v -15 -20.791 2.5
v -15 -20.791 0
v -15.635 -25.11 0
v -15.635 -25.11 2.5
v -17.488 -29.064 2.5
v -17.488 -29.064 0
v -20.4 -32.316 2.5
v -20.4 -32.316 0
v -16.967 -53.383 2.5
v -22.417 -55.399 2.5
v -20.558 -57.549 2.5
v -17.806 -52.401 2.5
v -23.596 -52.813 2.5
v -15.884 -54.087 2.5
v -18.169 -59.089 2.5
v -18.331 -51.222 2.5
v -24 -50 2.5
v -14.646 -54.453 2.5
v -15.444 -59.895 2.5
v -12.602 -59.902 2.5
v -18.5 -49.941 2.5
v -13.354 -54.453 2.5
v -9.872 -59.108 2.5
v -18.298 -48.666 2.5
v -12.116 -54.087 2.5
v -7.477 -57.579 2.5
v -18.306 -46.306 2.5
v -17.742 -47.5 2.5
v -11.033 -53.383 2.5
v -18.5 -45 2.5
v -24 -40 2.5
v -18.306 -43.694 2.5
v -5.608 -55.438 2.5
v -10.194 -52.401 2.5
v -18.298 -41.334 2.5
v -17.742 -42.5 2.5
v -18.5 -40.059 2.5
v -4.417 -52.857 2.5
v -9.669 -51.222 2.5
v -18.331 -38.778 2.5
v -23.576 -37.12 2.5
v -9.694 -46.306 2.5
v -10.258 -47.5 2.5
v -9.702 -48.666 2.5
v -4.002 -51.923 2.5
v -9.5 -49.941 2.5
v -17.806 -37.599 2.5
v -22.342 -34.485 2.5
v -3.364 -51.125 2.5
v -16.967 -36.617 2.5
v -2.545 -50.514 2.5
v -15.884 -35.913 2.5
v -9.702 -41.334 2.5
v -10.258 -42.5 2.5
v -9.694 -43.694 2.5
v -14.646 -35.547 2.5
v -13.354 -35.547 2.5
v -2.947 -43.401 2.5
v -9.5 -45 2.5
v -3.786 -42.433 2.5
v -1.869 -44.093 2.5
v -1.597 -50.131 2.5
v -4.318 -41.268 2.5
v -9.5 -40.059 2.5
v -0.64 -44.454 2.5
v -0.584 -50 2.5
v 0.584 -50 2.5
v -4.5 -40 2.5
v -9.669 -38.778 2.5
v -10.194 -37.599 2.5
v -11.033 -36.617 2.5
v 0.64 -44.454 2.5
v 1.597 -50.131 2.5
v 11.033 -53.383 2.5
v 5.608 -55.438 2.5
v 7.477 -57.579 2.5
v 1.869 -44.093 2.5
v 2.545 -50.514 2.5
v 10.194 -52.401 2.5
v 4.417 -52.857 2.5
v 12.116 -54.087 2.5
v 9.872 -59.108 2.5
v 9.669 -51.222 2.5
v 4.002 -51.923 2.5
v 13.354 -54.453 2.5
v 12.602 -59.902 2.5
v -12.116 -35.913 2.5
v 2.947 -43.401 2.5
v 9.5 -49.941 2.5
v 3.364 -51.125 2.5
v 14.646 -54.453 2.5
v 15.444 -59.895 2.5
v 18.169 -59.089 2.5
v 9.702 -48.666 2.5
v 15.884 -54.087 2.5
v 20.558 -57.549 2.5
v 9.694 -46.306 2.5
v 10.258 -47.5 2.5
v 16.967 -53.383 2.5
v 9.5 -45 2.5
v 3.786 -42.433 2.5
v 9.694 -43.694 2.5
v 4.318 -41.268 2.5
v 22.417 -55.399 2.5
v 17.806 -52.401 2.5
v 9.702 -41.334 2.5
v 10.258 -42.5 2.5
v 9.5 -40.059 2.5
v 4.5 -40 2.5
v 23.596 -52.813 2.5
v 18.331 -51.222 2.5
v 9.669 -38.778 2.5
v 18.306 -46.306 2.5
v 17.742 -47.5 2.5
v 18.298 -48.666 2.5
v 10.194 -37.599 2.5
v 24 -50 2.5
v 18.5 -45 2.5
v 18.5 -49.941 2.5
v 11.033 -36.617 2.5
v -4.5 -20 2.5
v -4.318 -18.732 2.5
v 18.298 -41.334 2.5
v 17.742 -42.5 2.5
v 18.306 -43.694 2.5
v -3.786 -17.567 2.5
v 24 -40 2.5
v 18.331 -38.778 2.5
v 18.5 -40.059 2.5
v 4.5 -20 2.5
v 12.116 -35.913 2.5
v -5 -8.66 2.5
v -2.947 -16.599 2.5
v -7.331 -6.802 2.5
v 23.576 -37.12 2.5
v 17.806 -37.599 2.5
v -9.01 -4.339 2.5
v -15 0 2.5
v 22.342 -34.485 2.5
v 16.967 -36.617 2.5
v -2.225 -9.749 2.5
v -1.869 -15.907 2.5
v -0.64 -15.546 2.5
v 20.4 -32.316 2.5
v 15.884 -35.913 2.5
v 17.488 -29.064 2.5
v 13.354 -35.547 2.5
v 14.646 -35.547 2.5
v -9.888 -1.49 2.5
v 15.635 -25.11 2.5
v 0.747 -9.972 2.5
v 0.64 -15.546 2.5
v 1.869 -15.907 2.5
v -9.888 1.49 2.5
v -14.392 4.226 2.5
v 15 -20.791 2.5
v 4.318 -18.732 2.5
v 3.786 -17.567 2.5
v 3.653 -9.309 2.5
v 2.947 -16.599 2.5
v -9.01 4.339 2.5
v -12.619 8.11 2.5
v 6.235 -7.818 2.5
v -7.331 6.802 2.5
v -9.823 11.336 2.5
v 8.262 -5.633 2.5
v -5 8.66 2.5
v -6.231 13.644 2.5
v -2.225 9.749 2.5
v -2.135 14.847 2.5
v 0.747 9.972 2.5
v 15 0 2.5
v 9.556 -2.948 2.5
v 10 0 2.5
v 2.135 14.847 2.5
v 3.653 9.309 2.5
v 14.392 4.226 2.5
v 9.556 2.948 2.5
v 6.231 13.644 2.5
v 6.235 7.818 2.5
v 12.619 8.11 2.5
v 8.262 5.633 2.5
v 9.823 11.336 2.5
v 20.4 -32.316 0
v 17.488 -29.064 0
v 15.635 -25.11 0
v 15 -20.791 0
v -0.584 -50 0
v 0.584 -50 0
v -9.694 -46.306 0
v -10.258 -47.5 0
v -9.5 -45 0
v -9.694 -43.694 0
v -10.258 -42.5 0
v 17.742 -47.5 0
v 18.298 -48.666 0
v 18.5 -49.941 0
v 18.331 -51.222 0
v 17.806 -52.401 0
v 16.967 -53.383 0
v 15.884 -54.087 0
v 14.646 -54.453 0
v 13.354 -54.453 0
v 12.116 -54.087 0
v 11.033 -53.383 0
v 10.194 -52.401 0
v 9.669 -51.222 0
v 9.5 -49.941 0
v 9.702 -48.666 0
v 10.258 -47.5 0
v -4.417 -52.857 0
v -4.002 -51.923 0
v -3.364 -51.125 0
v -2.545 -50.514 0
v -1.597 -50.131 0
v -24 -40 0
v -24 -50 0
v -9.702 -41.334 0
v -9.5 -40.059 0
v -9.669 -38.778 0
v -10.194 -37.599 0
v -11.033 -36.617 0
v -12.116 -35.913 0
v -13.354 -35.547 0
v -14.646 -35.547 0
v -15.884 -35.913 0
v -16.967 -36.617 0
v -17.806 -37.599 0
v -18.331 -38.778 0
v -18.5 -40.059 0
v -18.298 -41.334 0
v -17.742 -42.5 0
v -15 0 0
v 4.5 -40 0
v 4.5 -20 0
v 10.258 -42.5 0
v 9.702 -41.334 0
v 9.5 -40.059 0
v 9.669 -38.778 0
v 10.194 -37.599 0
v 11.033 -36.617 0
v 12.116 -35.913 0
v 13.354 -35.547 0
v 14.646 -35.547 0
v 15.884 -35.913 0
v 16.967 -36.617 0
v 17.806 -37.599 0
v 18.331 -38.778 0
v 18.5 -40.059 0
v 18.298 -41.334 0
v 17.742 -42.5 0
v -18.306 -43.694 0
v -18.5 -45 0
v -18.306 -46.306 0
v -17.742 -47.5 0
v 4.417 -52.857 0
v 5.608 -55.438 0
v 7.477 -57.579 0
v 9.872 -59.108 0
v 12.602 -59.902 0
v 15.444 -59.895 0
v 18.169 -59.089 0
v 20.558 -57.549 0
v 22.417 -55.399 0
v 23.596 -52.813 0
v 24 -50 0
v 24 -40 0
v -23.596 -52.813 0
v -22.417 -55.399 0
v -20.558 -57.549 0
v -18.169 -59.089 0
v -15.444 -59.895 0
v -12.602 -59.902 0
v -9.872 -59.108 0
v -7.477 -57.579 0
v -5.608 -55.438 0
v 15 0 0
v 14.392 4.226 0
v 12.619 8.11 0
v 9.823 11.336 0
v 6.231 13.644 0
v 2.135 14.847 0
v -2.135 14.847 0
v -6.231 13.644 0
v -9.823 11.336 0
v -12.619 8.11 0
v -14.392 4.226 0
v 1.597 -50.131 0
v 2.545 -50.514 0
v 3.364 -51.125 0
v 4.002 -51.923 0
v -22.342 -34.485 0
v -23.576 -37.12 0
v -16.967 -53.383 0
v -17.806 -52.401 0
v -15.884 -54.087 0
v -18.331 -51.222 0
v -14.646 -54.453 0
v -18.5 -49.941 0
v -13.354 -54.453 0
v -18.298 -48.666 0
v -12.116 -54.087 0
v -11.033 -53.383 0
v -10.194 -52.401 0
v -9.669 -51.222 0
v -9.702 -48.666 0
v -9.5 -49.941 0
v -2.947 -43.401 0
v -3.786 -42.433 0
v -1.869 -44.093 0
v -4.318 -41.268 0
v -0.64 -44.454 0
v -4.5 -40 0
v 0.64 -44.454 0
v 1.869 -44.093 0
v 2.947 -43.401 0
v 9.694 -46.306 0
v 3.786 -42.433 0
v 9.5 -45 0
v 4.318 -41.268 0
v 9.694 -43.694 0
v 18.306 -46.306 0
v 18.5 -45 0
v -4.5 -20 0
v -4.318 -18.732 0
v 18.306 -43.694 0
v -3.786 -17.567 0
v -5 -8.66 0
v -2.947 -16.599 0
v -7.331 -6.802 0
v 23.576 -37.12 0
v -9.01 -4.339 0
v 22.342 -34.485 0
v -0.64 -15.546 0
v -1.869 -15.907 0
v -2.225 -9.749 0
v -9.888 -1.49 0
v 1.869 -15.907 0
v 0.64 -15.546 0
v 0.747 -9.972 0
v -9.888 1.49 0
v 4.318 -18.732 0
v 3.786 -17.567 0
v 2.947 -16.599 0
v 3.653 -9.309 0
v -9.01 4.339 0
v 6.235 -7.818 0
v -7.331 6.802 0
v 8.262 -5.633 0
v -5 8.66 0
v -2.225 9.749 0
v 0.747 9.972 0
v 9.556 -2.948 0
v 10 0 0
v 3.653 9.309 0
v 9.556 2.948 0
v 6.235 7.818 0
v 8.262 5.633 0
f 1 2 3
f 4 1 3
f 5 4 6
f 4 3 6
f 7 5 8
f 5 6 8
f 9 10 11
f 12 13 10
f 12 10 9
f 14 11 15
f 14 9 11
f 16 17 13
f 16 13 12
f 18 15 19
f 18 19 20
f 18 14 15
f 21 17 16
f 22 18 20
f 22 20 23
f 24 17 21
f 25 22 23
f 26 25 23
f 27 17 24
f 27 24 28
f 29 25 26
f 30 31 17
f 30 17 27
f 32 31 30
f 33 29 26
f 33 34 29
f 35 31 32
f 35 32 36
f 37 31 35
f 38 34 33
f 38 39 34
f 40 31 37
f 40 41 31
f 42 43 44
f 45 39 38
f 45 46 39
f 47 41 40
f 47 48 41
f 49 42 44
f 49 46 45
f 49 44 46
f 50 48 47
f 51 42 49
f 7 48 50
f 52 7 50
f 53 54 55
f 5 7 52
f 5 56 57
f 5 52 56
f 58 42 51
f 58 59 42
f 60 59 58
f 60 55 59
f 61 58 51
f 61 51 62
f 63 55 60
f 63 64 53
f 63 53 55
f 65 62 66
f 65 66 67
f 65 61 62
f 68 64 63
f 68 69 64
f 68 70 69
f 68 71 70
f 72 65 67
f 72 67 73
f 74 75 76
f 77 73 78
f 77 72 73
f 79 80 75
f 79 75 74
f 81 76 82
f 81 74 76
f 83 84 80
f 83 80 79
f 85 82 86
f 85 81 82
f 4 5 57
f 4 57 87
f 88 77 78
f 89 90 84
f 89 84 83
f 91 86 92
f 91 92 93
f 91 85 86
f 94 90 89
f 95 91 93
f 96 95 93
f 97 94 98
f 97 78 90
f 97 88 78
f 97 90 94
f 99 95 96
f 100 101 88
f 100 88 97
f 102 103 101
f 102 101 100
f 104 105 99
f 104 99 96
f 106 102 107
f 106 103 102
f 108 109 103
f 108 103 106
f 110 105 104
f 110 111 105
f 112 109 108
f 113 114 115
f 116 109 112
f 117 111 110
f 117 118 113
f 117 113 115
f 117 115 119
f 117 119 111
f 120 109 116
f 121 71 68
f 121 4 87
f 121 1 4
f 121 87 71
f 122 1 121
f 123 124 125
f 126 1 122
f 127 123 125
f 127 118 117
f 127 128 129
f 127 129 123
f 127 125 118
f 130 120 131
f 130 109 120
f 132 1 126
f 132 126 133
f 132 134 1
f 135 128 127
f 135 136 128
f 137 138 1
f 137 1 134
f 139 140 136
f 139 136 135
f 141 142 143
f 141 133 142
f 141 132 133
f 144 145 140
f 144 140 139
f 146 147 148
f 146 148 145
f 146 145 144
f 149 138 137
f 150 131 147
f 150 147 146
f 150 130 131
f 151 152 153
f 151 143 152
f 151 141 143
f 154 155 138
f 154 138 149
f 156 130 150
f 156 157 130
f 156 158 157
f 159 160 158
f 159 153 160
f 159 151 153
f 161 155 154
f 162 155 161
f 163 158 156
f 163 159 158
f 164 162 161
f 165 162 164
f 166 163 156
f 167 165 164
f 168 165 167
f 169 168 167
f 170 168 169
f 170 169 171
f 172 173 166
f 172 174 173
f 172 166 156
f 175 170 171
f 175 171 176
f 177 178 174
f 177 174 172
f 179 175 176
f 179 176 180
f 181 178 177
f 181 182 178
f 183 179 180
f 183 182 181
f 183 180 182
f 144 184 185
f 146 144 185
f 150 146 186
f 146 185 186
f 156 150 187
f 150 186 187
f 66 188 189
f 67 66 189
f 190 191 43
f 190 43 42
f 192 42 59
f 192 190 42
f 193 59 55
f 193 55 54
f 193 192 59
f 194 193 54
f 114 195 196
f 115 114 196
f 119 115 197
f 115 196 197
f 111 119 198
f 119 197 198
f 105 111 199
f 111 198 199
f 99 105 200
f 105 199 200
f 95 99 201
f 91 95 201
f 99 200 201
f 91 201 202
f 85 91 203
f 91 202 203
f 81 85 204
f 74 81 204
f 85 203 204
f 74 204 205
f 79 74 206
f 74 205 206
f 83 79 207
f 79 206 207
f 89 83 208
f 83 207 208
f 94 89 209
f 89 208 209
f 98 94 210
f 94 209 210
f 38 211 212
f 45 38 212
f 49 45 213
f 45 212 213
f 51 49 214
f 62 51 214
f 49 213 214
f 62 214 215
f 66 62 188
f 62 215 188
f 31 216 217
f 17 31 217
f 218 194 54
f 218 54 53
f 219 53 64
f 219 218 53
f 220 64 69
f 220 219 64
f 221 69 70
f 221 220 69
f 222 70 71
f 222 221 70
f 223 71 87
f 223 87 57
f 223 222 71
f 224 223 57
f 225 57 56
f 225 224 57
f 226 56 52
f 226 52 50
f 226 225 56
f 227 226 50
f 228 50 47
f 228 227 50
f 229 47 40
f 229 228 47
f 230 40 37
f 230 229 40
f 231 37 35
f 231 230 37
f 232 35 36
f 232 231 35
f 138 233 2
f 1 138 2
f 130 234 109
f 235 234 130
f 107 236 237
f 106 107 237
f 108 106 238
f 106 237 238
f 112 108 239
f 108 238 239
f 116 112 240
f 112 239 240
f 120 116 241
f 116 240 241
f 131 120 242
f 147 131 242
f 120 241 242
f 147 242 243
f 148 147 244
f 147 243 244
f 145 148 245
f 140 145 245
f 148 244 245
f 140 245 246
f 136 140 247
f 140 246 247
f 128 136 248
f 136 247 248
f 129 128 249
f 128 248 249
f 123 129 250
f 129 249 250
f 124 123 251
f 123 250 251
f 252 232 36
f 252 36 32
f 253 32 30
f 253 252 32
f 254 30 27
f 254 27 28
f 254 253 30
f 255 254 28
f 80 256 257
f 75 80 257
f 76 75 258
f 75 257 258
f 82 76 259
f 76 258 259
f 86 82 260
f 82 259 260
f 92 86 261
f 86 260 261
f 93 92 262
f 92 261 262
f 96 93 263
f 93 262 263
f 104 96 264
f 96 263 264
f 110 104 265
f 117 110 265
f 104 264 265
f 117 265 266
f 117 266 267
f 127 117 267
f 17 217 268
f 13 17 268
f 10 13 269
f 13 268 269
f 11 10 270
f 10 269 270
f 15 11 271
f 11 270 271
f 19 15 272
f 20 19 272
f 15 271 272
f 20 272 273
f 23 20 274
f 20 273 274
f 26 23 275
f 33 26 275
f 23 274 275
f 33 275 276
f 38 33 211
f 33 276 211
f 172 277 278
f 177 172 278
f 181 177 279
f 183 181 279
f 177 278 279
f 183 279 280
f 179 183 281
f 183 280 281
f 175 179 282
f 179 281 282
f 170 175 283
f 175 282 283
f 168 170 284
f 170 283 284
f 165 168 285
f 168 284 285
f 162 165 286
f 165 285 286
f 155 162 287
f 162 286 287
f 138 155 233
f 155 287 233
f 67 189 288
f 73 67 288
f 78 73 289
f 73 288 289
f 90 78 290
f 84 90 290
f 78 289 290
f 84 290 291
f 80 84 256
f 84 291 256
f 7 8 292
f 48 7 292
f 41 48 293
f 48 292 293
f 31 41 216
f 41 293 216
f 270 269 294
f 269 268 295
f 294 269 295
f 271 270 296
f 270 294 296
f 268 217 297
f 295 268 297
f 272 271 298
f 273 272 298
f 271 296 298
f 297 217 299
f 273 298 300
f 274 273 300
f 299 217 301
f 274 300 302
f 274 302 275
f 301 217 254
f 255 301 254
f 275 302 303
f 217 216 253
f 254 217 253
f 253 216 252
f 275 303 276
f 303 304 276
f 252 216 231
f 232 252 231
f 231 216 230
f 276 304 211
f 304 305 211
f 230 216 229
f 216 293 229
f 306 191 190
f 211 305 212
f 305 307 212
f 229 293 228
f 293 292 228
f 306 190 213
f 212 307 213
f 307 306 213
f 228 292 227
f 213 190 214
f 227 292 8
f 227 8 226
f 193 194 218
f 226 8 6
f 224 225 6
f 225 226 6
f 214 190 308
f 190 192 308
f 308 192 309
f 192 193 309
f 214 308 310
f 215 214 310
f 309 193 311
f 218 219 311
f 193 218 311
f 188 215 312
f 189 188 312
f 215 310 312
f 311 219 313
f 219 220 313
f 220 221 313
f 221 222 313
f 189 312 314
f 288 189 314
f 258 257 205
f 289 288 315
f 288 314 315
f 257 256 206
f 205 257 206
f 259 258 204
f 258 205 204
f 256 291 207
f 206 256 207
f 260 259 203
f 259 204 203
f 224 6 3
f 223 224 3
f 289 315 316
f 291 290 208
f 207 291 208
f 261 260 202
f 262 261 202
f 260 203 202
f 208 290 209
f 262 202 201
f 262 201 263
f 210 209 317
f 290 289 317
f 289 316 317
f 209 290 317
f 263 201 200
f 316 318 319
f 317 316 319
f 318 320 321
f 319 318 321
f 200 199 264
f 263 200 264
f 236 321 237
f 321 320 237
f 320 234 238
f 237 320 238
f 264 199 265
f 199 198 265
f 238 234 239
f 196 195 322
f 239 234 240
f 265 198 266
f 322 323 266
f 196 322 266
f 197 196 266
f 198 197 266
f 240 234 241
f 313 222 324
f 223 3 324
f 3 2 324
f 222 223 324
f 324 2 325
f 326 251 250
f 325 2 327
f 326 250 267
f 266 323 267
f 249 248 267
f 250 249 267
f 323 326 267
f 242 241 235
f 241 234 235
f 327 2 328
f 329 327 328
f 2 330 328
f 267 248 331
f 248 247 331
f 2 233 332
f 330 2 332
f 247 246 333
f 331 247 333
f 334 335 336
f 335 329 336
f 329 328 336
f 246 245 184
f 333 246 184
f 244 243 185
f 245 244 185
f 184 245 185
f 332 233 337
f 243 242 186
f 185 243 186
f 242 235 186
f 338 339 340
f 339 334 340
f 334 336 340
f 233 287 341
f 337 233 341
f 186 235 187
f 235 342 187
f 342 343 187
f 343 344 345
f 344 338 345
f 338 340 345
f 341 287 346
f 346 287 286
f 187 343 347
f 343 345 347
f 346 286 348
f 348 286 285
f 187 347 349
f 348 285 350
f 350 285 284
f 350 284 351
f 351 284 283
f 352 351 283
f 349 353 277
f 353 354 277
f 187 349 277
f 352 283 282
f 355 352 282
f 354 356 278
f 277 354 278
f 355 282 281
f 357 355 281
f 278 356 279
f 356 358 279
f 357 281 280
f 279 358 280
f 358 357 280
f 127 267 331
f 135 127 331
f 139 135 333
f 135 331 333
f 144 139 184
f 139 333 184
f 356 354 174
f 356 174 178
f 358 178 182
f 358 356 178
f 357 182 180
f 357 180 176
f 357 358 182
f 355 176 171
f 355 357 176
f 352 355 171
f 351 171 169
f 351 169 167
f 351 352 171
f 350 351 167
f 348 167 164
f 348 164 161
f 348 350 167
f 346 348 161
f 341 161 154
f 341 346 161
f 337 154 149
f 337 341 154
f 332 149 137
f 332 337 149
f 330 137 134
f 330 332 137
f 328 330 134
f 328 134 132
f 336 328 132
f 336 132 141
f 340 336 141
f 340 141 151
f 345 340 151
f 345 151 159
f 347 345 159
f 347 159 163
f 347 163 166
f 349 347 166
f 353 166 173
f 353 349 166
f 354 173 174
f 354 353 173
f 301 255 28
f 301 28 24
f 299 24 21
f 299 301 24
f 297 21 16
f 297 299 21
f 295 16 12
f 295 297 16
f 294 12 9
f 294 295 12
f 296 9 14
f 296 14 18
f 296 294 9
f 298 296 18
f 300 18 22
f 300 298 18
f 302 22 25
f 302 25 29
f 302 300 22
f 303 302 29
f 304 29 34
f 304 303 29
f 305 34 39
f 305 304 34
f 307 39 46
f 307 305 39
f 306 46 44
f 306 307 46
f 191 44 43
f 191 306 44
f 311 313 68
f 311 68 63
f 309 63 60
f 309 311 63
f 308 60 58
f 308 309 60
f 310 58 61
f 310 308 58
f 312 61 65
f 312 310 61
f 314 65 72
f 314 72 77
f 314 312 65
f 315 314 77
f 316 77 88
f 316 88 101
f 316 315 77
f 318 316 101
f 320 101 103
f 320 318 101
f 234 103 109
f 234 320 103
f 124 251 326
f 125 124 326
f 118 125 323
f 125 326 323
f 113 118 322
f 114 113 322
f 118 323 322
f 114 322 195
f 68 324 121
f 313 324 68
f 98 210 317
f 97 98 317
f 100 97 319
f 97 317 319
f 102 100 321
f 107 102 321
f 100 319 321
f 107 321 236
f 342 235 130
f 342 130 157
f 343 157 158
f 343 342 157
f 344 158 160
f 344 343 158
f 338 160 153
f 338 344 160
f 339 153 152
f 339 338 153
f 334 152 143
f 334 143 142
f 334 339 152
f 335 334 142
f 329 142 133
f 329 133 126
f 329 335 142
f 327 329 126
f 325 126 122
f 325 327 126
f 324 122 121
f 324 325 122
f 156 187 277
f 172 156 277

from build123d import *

# Parameters (mm, degrees)
SKETCH_1_R      = 10
EXTRUDE_1_DEPTH = 2.5


with BuildPart() as part:
    # 草图1 → 凸台-拉伸1 (new body)
    with BuildSketch(Plane.XY):
        with BuildLine():
            Line((-24, -40), (-24, -50))
            ThreePointArc((-24, -50), (-15.443695821, -59.895238369), (-4.416851525, -52.857142857))
            ThreePointArc((-4.416851525, -52.857142857), (-2.974049354, -50.792865097), (-0.583592135, -50))
            Line((-0.583592135, -50), (0.583592135, -50))
            ThreePointArc((0.583592135, -50), (2.974049354, -50.792865097), (4.416851525, -52.857142857))
            ThreePointArc((4.416851525, -52.857142857), (15.443695821, -59.895238369), (24, -50))
            Line((24, -50), (24, -40))
            ThreePointArc((24, -40), (23.055385138, -35.757359313), (20.4, -32.316250915))
            ThreePointArc((20.4, -32.316250915), (16.416922293, -27.154588318), (15, -20.790627288))
            Line((15, -20.790627288), (15, 0))
            ThreePointArc((15, 0), (0, 15), (-15, 0))
            Line((-15, 0), (-15, -20.790627288))
            ThreePointArc((-15, -20.790627288), (-16.416922293, -27.154588318), (-20.4, -32.316250915))
            ThreePointArc((-20.4, -32.316250915), (-23.055385138, -35.757359313), (-24, -40))
        make_face()
        Circle(SKETCH_1_R, mode=Mode.SUBTRACT)
        with BuildLine():
            Line((-4.5, -20), (-4.5, -40))
            ThreePointArc((-4.5, -40), (0, -44.5), (4.5, -40))
            Line((4.5, -40), (4.5, -20))
            ThreePointArc((4.5, -20), (0, -15.5), (-4.5, -20))
        make_face(mode=Mode.SUBTRACT)
        with BuildLine():
            ThreePointArc((-17.741657387, -47.5), (-14, -54.5), (-10.258342613, -47.5))
            ThreePointArc((-10.258342613, -47.5), (-9.5, -45), (-10.258342613, -42.5))
            ThreePointArc((-10.258342613, -42.5), (-14, -35.5), (-17.741657387, -42.5))
            ThreePointArc((-17.741657387, -42.5), (-18.5, -45), (-17.741657387, -47.5))
        make_face(mode=Mode.SUBTRACT)
        with BuildLine():
            ThreePointArc((10.258342613, -47.5), (9.5, -45), (10.258342613, -42.5))
            ThreePointArc((10.258342613, -42.5), (14, -35.5), (17.741657387, -42.5))
            ThreePointArc((17.741657387, -42.5), (18.5, -45), (17.741657387, -47.5))
            ThreePointArc((17.741657387, -47.5), (14, -54.5), (10.258342613, -47.5))
        make_face(mode=Mode.SUBTRACT)
    extrude(amount=EXTRUDE_1_DEPTH)


solid = part.part
